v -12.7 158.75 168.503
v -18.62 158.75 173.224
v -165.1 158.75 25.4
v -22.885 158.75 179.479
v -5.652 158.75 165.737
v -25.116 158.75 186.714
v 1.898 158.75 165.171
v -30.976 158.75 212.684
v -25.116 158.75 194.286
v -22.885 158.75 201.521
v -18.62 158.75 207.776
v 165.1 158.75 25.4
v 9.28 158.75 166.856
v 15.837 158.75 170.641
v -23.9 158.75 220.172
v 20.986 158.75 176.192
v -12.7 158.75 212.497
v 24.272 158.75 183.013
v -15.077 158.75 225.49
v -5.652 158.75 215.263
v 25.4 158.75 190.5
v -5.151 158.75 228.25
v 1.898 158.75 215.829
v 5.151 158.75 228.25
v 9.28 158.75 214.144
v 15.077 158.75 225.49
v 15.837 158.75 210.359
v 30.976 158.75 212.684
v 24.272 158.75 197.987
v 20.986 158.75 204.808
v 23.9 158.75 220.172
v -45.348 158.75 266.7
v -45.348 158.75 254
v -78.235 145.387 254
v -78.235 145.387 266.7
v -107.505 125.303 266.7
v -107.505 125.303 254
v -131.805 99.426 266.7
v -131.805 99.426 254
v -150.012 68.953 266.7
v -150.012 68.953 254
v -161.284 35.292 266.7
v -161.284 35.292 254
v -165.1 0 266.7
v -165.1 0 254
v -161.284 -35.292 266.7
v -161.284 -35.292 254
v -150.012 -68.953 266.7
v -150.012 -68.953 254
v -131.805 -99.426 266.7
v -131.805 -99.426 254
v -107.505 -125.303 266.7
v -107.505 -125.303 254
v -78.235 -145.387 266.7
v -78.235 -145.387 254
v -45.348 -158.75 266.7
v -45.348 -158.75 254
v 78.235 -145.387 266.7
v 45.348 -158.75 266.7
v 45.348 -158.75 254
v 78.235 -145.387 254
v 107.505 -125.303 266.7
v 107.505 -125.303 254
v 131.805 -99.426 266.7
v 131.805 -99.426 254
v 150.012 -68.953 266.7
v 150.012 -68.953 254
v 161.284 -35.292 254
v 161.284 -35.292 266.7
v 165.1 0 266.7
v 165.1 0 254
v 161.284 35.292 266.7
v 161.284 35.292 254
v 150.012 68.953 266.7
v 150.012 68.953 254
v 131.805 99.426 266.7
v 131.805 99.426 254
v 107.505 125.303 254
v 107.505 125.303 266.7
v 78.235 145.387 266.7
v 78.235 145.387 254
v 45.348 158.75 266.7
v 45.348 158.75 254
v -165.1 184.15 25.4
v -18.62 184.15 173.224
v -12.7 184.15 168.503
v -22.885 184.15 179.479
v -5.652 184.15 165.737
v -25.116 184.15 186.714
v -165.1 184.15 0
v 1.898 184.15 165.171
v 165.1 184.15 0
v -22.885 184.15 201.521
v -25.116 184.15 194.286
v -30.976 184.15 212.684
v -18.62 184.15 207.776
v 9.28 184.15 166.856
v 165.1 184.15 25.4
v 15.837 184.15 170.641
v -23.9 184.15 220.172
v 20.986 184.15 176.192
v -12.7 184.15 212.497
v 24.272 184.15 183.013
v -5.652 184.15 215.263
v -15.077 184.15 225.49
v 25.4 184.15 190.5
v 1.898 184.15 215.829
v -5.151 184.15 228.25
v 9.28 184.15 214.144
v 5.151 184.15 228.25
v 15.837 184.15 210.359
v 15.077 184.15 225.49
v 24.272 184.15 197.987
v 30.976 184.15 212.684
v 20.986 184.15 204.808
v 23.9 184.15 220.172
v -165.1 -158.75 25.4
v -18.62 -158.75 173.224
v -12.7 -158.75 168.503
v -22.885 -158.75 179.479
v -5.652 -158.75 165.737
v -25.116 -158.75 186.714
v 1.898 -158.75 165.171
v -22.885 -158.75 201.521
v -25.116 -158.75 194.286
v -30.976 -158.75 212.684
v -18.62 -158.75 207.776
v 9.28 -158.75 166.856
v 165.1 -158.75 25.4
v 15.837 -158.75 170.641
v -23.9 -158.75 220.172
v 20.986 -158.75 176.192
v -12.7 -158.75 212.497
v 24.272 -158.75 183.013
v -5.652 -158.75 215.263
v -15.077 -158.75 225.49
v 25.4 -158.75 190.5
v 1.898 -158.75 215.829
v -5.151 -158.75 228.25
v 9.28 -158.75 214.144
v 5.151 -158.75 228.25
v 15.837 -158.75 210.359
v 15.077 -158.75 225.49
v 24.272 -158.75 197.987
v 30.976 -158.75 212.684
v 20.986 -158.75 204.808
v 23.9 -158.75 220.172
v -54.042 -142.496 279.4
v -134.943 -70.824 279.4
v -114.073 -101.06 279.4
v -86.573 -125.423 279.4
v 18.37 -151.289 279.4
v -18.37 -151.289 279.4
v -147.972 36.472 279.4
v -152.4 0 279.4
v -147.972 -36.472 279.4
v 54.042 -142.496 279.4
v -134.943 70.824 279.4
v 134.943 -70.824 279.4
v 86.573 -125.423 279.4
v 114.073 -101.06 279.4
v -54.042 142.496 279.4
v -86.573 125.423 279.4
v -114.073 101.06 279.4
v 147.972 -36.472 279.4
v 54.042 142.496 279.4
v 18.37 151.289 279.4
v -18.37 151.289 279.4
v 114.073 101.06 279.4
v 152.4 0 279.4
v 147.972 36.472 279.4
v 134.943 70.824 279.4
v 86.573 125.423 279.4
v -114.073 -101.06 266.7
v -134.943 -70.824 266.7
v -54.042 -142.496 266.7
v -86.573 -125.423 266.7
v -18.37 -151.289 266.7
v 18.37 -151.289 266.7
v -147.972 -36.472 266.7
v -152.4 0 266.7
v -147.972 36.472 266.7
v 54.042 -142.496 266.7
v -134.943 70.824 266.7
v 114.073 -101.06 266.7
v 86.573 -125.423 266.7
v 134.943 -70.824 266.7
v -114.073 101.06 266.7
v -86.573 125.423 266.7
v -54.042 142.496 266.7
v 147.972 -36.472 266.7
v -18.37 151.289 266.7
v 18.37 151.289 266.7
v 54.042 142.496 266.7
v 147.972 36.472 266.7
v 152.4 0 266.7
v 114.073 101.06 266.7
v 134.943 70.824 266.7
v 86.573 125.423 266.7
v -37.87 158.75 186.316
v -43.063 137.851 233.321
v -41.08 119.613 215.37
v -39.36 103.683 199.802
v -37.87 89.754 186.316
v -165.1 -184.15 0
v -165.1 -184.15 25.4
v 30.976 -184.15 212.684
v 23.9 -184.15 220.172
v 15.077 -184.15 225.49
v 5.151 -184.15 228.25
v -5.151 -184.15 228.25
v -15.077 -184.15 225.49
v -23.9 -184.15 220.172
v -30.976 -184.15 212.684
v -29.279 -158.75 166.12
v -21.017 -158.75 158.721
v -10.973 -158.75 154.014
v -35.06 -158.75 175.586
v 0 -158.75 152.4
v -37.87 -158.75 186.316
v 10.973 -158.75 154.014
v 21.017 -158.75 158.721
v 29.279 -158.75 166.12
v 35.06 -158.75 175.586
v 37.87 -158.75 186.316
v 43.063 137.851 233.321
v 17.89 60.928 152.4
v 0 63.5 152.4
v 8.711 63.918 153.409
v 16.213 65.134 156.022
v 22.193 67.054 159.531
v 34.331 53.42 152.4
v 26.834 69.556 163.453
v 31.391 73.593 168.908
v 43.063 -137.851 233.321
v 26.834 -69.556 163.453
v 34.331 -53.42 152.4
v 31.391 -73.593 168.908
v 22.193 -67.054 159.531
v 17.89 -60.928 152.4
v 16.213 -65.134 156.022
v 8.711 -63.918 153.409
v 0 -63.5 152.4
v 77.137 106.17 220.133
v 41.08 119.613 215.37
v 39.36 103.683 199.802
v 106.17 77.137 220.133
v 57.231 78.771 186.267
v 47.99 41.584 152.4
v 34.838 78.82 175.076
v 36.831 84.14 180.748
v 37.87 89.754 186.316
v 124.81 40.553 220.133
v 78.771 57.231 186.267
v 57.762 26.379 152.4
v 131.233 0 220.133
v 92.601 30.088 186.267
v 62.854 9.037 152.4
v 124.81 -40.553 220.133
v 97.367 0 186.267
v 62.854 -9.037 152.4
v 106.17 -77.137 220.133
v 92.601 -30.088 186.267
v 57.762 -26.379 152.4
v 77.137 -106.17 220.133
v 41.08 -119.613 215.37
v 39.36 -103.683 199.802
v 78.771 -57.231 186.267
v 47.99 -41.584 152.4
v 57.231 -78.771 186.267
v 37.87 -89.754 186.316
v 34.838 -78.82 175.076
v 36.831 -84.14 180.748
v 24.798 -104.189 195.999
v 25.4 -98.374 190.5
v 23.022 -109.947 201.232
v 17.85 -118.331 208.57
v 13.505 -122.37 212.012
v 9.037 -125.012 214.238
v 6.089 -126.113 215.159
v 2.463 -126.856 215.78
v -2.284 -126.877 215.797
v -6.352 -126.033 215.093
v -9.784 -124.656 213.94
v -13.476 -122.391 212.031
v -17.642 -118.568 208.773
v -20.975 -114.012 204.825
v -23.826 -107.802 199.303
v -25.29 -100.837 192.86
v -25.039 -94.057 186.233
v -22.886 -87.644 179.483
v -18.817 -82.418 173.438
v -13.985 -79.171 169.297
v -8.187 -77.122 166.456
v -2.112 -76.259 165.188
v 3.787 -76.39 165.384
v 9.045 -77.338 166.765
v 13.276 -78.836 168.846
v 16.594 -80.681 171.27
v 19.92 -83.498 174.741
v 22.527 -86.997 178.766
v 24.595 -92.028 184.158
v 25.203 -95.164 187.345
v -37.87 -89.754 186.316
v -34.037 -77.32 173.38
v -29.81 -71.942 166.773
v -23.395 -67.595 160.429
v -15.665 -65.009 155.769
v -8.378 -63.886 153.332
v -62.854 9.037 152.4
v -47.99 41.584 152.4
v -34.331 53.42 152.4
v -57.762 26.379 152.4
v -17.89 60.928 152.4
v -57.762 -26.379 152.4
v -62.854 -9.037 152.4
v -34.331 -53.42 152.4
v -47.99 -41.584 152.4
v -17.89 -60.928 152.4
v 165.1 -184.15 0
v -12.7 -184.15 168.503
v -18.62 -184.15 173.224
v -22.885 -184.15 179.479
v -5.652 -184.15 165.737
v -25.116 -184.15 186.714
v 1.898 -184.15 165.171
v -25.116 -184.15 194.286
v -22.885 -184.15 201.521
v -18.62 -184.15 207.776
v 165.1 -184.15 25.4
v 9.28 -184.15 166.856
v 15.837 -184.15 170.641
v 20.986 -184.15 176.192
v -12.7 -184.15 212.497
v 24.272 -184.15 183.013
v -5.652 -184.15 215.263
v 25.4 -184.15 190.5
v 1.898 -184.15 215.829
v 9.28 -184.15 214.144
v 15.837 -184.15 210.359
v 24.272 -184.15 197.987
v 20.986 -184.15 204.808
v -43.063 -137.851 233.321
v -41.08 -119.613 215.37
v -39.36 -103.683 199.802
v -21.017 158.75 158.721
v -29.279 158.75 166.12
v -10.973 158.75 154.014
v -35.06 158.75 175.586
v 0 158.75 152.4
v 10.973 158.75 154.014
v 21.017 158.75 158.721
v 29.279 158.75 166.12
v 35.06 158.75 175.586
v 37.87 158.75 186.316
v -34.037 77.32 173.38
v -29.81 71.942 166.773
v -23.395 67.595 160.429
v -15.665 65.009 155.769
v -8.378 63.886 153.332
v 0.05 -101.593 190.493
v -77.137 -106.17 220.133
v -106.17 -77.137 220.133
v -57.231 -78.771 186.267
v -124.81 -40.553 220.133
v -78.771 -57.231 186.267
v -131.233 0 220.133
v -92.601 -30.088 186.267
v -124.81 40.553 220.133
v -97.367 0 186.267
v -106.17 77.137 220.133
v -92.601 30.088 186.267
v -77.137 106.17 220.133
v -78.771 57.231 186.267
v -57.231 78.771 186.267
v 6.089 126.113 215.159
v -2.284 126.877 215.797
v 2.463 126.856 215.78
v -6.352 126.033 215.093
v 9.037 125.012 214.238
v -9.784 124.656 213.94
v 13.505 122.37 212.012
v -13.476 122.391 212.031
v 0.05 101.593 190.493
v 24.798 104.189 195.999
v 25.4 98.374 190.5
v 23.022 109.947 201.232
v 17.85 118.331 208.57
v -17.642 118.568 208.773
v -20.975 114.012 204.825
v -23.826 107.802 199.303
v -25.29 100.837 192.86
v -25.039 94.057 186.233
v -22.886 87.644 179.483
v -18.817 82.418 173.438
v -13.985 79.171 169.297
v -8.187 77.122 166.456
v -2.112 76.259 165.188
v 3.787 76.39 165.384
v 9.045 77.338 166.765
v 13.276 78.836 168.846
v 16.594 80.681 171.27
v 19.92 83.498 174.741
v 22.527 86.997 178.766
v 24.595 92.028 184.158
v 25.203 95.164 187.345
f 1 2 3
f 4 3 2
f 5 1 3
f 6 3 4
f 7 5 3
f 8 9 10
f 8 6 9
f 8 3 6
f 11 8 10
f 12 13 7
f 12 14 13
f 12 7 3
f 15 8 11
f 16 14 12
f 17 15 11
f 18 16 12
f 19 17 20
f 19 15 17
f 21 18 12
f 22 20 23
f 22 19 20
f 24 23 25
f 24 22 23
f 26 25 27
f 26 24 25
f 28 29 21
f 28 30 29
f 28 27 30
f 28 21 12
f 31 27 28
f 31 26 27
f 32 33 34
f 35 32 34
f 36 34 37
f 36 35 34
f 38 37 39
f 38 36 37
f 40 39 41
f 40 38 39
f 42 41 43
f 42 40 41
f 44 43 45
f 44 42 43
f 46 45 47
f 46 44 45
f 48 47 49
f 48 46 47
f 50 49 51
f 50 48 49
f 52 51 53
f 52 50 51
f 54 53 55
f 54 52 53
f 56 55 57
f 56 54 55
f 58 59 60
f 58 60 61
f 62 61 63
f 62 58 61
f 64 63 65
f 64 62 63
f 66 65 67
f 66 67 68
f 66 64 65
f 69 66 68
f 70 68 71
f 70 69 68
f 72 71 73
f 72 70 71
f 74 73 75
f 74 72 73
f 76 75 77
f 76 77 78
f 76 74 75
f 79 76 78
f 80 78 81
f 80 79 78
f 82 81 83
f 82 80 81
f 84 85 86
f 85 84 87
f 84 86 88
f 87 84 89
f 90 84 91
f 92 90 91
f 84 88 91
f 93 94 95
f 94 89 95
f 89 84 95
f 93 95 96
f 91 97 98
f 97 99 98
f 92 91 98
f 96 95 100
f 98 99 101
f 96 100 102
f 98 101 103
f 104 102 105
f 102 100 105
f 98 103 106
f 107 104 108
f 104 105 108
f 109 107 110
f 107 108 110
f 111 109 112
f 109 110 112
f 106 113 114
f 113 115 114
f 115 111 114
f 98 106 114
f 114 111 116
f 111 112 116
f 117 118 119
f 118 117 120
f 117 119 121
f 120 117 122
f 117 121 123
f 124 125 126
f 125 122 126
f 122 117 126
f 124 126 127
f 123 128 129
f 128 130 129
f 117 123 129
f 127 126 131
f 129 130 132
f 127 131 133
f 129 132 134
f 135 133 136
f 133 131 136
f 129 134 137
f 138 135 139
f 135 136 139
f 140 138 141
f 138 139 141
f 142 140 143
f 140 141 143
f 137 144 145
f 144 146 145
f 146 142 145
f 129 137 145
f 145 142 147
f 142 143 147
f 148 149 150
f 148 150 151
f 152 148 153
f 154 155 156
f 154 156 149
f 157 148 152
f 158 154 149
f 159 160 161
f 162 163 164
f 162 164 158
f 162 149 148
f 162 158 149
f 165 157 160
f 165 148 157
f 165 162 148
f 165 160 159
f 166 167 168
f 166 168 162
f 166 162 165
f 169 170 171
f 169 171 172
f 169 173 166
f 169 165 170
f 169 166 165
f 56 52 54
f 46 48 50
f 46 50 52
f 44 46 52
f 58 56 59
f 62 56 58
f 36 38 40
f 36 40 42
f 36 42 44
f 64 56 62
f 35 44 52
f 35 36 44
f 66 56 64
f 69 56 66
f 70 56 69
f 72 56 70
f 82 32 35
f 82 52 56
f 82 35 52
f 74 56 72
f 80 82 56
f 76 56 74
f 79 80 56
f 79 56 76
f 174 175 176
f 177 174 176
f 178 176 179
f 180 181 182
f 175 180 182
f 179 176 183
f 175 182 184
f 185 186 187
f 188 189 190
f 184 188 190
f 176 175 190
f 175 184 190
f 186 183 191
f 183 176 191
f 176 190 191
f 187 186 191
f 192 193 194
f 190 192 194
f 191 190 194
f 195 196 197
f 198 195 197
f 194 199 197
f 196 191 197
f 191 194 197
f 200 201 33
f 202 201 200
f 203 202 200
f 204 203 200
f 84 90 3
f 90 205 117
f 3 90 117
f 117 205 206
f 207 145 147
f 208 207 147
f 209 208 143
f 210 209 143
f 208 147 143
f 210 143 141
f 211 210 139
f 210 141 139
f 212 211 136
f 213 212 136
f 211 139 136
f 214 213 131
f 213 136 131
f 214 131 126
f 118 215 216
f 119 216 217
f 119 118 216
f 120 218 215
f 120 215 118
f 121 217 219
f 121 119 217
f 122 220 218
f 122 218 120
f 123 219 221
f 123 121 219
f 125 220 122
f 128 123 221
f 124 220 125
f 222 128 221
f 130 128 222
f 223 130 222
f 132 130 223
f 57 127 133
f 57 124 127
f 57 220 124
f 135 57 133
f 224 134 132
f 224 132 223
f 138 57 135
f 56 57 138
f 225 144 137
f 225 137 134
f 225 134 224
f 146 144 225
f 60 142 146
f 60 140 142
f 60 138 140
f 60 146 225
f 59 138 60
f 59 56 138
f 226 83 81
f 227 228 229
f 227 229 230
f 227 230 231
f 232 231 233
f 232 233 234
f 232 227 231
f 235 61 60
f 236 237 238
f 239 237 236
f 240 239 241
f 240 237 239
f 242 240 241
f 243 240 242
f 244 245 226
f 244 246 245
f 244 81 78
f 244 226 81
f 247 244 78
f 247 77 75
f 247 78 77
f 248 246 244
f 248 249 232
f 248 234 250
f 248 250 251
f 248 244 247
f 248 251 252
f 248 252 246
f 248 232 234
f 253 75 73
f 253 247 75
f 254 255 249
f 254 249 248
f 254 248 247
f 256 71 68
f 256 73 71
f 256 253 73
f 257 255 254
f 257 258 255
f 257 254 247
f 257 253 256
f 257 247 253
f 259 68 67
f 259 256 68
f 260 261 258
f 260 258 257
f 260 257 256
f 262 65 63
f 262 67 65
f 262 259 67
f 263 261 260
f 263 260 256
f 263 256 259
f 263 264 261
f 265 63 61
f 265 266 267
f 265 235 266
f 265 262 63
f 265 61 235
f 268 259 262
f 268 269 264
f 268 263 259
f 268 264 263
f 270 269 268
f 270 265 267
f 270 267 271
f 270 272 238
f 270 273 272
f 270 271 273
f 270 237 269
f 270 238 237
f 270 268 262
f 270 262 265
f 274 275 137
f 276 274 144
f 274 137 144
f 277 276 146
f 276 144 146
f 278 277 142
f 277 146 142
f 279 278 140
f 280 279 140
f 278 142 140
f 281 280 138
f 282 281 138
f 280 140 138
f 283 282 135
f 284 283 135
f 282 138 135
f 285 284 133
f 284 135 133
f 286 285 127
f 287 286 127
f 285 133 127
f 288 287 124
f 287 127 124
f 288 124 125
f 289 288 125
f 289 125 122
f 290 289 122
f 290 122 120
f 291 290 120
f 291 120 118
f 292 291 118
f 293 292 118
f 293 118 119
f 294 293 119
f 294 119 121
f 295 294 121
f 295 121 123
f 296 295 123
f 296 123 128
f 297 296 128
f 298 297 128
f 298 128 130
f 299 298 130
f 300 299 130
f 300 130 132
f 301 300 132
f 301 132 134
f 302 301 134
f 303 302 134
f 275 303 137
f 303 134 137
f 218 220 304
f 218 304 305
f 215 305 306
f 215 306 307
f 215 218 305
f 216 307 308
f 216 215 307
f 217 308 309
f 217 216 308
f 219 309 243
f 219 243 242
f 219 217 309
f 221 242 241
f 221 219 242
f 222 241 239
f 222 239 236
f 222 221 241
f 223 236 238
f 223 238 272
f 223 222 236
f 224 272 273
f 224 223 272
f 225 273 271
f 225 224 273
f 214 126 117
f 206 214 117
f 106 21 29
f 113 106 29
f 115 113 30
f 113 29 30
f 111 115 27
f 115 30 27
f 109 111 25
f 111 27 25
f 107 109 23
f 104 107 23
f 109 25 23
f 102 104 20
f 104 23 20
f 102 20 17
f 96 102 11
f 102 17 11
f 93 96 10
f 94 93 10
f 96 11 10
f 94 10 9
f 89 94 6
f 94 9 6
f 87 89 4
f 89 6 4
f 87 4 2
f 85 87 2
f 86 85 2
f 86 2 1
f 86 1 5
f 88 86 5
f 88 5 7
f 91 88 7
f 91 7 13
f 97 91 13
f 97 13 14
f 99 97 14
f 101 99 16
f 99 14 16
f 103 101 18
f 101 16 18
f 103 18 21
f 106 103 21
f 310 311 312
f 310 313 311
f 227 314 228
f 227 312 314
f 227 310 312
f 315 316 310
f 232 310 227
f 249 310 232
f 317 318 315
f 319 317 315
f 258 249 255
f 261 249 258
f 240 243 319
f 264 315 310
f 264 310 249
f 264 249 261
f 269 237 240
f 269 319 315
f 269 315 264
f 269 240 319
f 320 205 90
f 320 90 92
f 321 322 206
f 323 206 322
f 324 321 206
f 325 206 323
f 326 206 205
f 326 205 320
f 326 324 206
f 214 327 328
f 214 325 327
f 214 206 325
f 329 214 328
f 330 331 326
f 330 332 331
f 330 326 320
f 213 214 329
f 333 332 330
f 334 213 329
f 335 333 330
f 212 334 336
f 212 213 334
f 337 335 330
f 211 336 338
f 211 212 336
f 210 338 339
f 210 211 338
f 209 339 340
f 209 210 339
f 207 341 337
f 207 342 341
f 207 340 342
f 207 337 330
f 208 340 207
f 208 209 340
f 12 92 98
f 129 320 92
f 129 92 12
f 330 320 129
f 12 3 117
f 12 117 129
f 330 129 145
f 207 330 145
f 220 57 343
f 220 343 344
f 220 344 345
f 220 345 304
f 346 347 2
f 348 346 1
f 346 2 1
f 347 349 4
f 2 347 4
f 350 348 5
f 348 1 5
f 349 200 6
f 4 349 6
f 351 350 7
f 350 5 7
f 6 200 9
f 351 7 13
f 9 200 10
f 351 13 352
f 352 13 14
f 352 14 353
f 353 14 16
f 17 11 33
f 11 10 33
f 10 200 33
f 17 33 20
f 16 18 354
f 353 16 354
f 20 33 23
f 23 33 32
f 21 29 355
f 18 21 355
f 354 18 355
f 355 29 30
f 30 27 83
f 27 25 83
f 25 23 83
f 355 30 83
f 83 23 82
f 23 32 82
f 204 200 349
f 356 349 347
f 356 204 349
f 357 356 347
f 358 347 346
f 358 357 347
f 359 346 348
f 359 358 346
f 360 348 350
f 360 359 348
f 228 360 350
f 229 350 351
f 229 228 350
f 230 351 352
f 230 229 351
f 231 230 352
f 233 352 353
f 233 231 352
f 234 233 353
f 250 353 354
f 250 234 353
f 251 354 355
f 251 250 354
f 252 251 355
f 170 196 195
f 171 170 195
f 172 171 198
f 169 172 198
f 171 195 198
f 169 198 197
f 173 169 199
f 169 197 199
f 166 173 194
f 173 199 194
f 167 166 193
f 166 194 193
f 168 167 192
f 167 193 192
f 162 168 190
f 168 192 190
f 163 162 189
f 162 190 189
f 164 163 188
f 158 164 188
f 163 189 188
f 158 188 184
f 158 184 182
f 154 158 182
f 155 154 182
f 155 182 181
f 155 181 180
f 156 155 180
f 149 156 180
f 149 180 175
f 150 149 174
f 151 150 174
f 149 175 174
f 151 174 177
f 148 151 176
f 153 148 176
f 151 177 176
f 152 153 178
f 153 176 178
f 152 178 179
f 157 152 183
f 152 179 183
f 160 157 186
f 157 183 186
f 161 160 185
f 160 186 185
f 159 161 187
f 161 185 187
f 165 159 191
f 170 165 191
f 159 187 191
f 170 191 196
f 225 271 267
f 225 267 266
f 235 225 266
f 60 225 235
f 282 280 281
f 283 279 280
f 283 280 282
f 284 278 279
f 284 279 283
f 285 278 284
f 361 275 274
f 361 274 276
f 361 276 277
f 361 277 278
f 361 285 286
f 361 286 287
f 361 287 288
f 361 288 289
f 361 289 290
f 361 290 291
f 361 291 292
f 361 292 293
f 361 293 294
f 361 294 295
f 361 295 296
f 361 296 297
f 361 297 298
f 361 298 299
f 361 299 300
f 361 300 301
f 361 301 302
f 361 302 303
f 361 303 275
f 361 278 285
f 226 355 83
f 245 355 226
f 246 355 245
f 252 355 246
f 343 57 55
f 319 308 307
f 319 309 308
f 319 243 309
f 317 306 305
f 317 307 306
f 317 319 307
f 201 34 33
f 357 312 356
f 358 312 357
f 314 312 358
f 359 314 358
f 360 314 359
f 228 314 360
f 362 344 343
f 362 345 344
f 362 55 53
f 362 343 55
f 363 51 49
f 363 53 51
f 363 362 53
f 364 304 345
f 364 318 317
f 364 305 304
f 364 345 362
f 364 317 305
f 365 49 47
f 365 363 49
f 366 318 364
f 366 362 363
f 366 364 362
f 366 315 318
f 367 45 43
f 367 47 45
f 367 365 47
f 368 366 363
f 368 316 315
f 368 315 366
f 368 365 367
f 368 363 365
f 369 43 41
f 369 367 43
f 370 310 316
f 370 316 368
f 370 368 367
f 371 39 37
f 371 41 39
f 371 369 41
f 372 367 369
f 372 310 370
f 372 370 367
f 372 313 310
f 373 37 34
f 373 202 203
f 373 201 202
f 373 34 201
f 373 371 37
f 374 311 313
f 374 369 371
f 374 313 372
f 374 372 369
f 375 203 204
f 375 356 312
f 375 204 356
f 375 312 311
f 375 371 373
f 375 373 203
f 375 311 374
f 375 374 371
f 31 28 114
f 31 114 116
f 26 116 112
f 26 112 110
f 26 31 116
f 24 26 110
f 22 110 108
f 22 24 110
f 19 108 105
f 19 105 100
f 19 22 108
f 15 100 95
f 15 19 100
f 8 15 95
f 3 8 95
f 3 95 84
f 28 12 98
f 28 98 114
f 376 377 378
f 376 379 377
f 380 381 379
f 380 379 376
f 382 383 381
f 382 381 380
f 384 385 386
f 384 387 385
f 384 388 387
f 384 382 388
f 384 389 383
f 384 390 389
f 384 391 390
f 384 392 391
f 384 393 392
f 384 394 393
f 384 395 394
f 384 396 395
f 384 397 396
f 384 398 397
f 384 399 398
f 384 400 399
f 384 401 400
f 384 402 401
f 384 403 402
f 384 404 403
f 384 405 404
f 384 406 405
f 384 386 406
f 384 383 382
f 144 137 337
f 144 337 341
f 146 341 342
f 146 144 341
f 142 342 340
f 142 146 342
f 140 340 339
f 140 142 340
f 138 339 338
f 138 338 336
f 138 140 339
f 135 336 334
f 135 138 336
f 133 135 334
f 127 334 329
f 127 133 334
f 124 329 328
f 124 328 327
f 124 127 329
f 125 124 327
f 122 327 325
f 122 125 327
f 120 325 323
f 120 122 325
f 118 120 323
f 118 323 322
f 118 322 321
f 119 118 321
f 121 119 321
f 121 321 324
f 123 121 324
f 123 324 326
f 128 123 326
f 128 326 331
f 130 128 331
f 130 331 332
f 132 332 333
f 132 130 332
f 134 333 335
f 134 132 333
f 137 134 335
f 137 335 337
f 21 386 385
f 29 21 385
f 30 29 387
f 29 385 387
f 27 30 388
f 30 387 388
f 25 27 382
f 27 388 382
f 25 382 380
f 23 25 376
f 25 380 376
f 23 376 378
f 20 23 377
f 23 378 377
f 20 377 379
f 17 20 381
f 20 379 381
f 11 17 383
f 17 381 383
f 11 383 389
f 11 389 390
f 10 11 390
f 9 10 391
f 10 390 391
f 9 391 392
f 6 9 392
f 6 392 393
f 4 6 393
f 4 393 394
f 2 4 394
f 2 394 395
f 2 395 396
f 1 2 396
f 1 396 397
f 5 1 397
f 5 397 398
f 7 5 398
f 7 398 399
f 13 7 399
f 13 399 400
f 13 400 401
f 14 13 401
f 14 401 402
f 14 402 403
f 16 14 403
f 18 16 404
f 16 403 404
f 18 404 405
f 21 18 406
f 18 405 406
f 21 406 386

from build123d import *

# Parameters (mm, degrees)
F0_W      = 330.2
F0_H      = 317.5
F1_DEPTH  = 25.4
F2_W      = 330.2
F2_H      = 25.4
F2_R      = 25.4
F3_DEPTH  = 25.4
F7_DEPTH  = 12.7
F7_FACE_R = 165.1
F8_DEPTH  = 101.6
F8_TAPER  = 45
F9_DEPTH  = 266.701
F10_R     = 25.4
F11_DEPTH = 317.5
F12_R     = 152.4
F13_DEPTH = 12.7


with BuildPart() as f1:
    # F0 (on Top) → F1 (new body)
    with BuildSketch(Plane.XY):
        Rectangle(F0_W, F0_H)
    extrude(amount=F1_DEPTH)

    # F2 (on face) → F3 (join)
    with BuildSketch(Plane.XZ.offset(158.75)):
        with Locations((0, 12.7)):
            Rectangle(F2_W, F2_H)
        with BuildLine():
            Line((-30.975823358, 212.6835156657), (-165.1, 25.4))
            Line((-165.1, 25.4), (165.1, 25.4))
            Line((165.1, 25.4), (30.975823358, 212.6835156657))
            ThreePointArc((30.975823358, 212.6835156657), (36.2752592681, 202.149702358), (38.1, 190.5))
            ThreePointArc((38.1, 190.5), (-11.649702358, 154.2247407319), (-30.975823358, 212.6835156657))
        make_face()
        with BuildLine():
            ThreePointArc((30.975823358, 212.6835156657), (0, 228.6), (-30.975823358, 212.6835156657))
            ThreePointArc((-30.975823358, 212.6835156657), (-11.649702358, 154.2247407319), (38.1, 190.5))
            ThreePointArc((38.1, 190.5), (36.2752592681, 202.149702358), (30.975823358, 212.6835156657))
        make_face()
        with Locations((0, 190.5)):
            Circle(F2_R, mode=Mode.SUBTRACT)
    extrude(amount=F3_DEPTH)

    # F4: F1 across plane


with BuildPart() as f1_1:
    add(f1.part)
    add(f1.part.mirror(Plane.XZ))


with BuildPart() as f7:
    # F6 (on offset) → F7 (new body)
    with BuildSketch(Plane.XY.offset(266.7)):
        with BuildLine():
            ThreePointArc((45.3480705212, -158.75), (131.8047352015, -99.4259612902), (165.1, 0))
            ThreePointArc((165.1, 0), (131.8047352015, 99.4259612902), (45.3480705212, 158.75))
            Line((45.3480705212, 158.75), (-45.3480705212, 158.75))
            ThreePointArc((-45.3480705212, 158.75), (-165.1, 0), (-45.3480705212, -158.75))
            Line((-45.3480705212, -158.75), (45.3480705212, -158.75))
        make_face()
        with BuildLine():
            ThreePointArc((-45.3480705212, -158.75), (0, -165.1), (45.3480705212, -158.75))
            Line((45.3480705212, -158.75), (-45.3480705212, -158.75))
        make_face()
        with BuildLine():
            Line((-45.3480705212, 158.75), (45.3480705212, 158.75))
            ThreePointArc((45.3480705212, 158.75), (0, 165.1), (-45.3480705212, 158.75))
        make_face()
    extrude(amount=-F7_DEPTH)

    # F7_face (on face) → F8 (join)
    with BuildSketch(Plane(origin=(0, 0, 254), x_dir=(1, 0, 0), z_dir=(0, 0, -1))):
        Circle(F7_FACE_R)
    extrude(amount=F8_DEPTH, taper=F8_TAPER)

    # F6 (on offset) → F9 (cut, through all)
    with BuildSketch(Plane.XY.offset(266.7)):
        with BuildLine():
            Line((-45.3480705212, 158.75), (45.3480705212, 158.75))
            ThreePointArc((45.3480705212, 158.75), (0, 165.1), (-45.3480705212, 158.75))
        make_face()
        with BuildLine():
            ThreePointArc((-45.3480705212, -158.75), (0, -165.1), (45.3480705212, -158.75))
            Line((45.3480705212, -158.75), (-45.3480705212, -158.75))
        make_face()
    extrude(amount=-F9_DEPTH, mode=Mode.SUBTRACT)

    # F10 (on face) → F11 (join, through all)
    with BuildSketch(Plane.XZ.offset(158.75)):
        with BuildLine():
            ThreePointArc((38.1, 190.5), (-2.0953009818, 228.5423410662), (-37.8695387819, 186.3157399167))
            ThreePointArc((-37.8695387819, 186.3157399167), (0, 152.4), (37.8695387819, 186.3157399167))
            ThreePointArc((37.8695387819, 186.3157399167), (38.0423410662, 188.4046990182), (38.1, 190.5))
        make_face()
        with Locations((0, 190.5)):
            Circle(F10_R, mode=Mode.SUBTRACT)
        with BuildLine():
            add(Edge.make_bspline(
                [(-45.3480705212, 254), (0, 241.5442307692), (45.3480705212, 254)],
                knots=[-0.2819082891, -0.2819082891, -0.2819082891, 0.2819082891, 0.2819082891, 0.2819082891], degree=2, weights=[1, 1.04, 1]))
            Line((-45.3480705212, 254), (-37.8695387819, 186.3157399167))
            ThreePointArc((-37.8695387819, 186.3157399167), (-2.0953009818, 228.5423410662), (38.1, 190.5))
            ThreePointArc((38.1, 190.5), (38.0423410662, 188.4046990182), (37.8695387819, 186.3157399167))
            Line((37.8695387819, 186.3157399167), (45.3480705212, 254))
        make_face()
    extrude(amount=-F11_DEPTH)


with BuildPart() as f13:
    # F12 (on face) → F13 (new body)
    with BuildSketch(Plane.XY.offset(266.7)):
        Circle(F12_R)
    extrude(amount=F13_DEPTH)


solid = Compound([f1_1.part, f7.part, f13.part])
